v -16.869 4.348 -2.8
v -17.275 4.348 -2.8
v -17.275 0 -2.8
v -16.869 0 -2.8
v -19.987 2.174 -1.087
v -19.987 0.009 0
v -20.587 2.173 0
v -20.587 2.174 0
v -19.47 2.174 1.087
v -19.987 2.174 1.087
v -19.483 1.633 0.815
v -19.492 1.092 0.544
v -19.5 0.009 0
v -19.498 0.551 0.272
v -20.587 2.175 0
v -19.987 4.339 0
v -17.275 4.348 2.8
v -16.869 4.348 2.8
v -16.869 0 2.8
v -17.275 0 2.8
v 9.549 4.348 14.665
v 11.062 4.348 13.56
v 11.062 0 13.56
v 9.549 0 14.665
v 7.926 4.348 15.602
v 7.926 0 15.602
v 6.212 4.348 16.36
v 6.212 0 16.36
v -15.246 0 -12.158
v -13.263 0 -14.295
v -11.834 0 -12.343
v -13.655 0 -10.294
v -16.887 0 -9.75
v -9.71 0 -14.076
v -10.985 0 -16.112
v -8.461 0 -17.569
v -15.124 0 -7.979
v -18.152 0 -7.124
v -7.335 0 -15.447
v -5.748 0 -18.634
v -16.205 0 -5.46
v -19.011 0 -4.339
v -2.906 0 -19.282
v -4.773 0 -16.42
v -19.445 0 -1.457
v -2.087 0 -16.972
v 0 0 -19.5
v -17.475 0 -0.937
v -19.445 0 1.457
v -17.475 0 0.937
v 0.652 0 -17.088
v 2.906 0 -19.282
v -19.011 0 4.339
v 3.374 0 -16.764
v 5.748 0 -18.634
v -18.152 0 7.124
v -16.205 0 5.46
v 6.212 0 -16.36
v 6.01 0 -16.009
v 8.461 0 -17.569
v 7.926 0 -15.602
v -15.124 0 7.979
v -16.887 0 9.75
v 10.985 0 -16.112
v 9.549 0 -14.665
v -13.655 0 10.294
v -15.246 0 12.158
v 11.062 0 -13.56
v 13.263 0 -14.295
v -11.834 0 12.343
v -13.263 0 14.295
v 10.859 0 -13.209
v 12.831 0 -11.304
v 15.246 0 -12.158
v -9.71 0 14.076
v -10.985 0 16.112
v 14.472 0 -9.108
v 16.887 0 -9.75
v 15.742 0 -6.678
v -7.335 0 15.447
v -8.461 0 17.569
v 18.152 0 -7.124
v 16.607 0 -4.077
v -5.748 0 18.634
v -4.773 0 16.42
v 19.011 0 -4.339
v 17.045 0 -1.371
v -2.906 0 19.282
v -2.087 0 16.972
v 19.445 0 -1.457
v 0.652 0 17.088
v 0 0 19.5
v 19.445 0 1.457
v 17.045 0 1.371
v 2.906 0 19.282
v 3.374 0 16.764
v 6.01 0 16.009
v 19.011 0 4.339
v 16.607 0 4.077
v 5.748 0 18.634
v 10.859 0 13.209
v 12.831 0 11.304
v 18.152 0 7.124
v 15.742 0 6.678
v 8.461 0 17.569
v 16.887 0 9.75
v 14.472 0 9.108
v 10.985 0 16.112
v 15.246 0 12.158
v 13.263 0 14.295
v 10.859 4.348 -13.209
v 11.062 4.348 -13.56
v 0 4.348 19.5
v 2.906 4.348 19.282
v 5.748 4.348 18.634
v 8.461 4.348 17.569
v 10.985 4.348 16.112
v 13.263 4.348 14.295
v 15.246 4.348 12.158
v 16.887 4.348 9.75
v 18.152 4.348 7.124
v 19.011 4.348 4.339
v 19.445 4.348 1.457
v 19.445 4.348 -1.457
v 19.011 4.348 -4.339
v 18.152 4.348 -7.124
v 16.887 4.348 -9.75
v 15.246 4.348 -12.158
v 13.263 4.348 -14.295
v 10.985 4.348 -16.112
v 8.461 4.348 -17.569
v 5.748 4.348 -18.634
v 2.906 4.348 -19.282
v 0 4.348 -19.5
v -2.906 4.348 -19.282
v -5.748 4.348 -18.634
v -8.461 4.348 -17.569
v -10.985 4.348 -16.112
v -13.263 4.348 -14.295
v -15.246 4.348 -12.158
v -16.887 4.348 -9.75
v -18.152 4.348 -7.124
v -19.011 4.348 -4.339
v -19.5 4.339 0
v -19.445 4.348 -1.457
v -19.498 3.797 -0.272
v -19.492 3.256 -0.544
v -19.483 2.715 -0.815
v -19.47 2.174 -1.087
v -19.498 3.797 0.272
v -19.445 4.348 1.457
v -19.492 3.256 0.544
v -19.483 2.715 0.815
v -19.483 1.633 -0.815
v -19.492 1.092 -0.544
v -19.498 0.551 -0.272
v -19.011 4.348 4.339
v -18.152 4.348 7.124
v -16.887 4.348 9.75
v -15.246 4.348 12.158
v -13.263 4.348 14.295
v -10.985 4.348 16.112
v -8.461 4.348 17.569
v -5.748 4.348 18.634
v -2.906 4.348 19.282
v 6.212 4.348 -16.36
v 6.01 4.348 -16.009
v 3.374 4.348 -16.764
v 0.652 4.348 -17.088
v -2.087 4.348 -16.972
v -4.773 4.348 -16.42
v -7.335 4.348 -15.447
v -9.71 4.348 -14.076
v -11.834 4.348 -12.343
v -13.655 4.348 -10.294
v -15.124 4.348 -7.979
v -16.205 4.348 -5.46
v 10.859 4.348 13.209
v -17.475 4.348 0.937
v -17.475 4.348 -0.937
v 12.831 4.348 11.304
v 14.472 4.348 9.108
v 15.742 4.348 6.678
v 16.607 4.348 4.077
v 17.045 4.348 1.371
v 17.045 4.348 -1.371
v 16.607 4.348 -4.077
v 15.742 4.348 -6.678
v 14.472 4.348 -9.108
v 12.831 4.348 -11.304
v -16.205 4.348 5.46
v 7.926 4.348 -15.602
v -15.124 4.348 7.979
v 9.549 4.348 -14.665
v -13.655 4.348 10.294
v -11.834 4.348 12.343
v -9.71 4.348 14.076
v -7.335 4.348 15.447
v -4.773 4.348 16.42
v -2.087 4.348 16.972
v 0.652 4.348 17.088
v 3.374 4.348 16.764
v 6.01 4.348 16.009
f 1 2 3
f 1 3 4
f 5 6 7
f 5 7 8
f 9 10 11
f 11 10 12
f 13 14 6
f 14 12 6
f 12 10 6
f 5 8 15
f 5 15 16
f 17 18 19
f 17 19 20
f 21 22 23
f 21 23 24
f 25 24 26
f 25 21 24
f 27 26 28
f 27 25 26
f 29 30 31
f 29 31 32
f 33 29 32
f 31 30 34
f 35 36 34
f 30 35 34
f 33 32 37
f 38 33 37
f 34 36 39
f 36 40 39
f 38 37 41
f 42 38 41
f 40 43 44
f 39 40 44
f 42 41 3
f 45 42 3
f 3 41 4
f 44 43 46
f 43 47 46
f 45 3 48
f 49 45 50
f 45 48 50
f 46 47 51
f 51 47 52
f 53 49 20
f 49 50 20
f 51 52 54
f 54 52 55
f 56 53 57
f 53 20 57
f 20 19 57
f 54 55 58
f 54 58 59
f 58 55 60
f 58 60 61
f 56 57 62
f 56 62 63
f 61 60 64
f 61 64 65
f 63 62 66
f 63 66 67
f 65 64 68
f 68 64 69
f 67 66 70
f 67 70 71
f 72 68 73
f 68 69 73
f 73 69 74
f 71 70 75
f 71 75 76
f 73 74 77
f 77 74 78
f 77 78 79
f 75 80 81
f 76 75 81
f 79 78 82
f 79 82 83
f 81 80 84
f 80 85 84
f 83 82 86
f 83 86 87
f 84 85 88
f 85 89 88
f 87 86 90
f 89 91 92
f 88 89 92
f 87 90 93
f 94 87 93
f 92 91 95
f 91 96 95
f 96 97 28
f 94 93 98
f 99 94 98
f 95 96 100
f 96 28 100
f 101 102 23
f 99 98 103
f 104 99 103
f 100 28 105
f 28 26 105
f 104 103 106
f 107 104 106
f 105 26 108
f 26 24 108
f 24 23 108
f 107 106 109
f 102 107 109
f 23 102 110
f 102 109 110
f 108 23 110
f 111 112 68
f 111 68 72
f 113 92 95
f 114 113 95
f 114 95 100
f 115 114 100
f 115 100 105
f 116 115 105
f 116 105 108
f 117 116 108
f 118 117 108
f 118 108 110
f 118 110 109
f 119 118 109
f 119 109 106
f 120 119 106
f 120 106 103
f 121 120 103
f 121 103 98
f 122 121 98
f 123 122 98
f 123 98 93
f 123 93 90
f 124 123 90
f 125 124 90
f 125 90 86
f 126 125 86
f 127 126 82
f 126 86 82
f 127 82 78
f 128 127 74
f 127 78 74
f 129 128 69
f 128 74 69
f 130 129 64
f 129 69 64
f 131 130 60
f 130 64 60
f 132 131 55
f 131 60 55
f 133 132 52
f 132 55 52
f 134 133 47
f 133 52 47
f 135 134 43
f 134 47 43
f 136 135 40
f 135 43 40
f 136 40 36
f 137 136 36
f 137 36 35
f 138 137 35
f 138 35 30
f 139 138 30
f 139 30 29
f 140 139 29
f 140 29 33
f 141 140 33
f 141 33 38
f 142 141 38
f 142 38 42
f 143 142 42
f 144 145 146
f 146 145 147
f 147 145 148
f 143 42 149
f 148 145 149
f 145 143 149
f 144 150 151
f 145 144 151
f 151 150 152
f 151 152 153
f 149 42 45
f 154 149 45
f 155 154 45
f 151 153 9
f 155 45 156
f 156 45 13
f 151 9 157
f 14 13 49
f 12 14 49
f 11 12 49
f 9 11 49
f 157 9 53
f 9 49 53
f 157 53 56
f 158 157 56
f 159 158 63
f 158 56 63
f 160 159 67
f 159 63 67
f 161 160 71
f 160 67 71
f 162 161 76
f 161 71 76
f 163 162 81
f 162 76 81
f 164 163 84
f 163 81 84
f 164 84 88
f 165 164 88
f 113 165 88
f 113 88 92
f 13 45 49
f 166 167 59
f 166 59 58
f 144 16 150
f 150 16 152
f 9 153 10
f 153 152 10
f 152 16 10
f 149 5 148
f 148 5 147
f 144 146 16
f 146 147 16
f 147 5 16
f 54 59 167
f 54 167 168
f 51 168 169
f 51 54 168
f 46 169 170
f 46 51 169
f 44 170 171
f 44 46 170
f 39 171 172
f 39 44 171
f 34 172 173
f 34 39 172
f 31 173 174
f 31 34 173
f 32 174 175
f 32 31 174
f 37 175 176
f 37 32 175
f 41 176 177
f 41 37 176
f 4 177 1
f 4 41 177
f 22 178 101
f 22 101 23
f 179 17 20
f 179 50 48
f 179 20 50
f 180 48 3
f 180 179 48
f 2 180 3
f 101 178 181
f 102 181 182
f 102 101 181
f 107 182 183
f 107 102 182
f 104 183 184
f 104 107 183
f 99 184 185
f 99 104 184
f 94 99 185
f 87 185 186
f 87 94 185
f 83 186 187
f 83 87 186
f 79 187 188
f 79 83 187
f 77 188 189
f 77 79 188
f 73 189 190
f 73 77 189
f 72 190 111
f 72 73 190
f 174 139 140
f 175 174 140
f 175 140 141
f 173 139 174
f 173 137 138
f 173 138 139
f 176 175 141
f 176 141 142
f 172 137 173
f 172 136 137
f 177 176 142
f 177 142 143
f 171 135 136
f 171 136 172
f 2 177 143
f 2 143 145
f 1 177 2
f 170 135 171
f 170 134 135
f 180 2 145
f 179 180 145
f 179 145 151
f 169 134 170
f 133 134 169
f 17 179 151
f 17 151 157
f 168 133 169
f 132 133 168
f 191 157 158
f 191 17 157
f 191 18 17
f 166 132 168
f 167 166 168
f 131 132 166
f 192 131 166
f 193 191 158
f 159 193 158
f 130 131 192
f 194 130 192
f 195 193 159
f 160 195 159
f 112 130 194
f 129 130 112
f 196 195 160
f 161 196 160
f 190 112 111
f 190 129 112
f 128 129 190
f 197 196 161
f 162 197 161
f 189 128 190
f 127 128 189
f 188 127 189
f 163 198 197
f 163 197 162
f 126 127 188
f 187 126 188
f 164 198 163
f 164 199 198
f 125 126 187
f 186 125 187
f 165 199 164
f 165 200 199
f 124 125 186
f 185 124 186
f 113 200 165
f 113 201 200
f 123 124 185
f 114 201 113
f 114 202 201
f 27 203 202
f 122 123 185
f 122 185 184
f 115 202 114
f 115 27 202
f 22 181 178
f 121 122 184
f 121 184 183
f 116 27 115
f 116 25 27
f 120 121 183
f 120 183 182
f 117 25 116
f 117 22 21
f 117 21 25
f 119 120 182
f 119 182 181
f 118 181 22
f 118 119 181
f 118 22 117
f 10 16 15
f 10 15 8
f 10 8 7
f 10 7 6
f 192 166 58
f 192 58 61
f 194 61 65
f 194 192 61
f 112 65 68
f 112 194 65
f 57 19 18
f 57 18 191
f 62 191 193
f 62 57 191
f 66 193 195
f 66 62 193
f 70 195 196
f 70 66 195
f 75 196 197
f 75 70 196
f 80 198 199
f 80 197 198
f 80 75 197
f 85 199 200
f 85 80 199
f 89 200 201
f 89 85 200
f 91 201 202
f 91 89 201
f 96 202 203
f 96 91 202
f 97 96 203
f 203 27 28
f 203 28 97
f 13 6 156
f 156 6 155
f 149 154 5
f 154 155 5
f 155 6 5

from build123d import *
from OCP.BRepFilletAPI import BRepFilletAPI_MakeChamfer

# Parameters (mm, degrees)
SKETCH1_R           = 19.5
SKETCH1_R_2         = 17.1
BOSS_EXTRUDE1_DEPTH = 4.347826087
BOSS_EXTRUDE2_DEPTH = 1.08695652
CHAMFER1_SIZE       = 0.6
CHAMFER1_SIZE2      = 0.971
CUT_EXTRUDE1_DEPTH  = 29.687564735


with BuildPart() as part:
    # Sketch1 → Boss-Extrude1 (new body)
    with BuildSketch(Plane(origin=(0, 0, 0), x_dir=(1, 0, 0), z_dir=(0, 1, 0))):
        with Locations(Location((0, 0, 0), (0, 0, 270))):
            Circle(SKETCH1_R)
        with Locations(Location((0, 0, 0), (0, 0, 270))):
            Circle(SKETCH1_R_2, mode=Mode.SUBTRACT)
    extrude(amount=BOSS_EXTRUDE1_DEPTH)

    # Sketch2 → Boss-Extrude2 (add, symmetric)
    with BuildSketch(Plane.ZY.offset(19.5)):
        Polygon((0, 0.00928426), (-1.086956522, 2.173913043), (0, 4.338541827), (1.086956522, 2.173913043), align=None)
    extrude(amount=BOSS_EXTRUDE2_DEPTH, both=True)

    # Chamfer1: one chamfer whose edges measure the first distance from different faces: ONE call of the kernel's chamfer builder (chamfer() names one face for all edges)
    chamfer1_edges_1 = [part.edges().sort_by_distance(p)[0] for p in [
        (-20.58695652, 3.256227435, -0.543478261),
    ]]
    chamfer1_side_1 = [part.faces().sort_by_distance(p)[0] for p in [
        (-20.038389639, 3.251243161, -0.545981087),
    ]]
    chamfer1_edges_2 = [part.edges().sort_by_distance(p)[0] for p in [
        (-20.58695652, 1.091598652, -0.543478261),
    ]]
    chamfer1_side_2 = [part.faces().sort_by_distance(p)[0] for p in [
        (-20.038389639, 1.096582926, -0.545981087),
    ]]
    chamfer1_edges_3 = [part.edges().sort_by_distance(p)[0] for p in [
        (-20.58695652, 1.091598652, 0.543478261),
    ]]
    chamfer1_side_3 = [part.faces().sort_by_distance(p)[0] for p in [
        (-20.038389639, 1.096582926, 0.545981087),
    ]]
    chamfer1_edges_4 = [part.edges().sort_by_distance(p)[0] for p in [
        (-20.58695652, 3.256227435, 0.543478261),
    ]]
    chamfer1_side_4 = [part.faces().sort_by_distance(p)[0] for p in [
        (-20.038389639, 3.251243161, 0.545981087),
    ]]
    chamfer1 = BRepFilletAPI_MakeChamfer(part.part.solid().wrapped)
    for e in chamfer1_edges_1:
        chamfer1.Add(CHAMFER1_SIZE, CHAMFER1_SIZE2, e.wrapped, chamfer1_side_1[0].wrapped)  # the first distance lies on this face
    for e in chamfer1_edges_2:
        chamfer1.Add(CHAMFER1_SIZE, CHAMFER1_SIZE2, e.wrapped, chamfer1_side_2[0].wrapped)  # the first distance lies on this face
    for e in chamfer1_edges_3:
        chamfer1.Add(CHAMFER1_SIZE, CHAMFER1_SIZE2, e.wrapped, chamfer1_side_3[0].wrapped)  # the first distance lies on this face
    for e in chamfer1_edges_4:
        chamfer1.Add(CHAMFER1_SIZE, CHAMFER1_SIZE2, e.wrapped, chamfer1_side_4[0].wrapped)  # the first distance lies on this face
    add(Compound.cast(chamfer1.Shape()), mode=Mode.REPLACE)

    # Sketch3 → Cut-Extrude1 (cut, through all)
    with BuildSketch(Plane(origin=(0, 4.347826087, 0), x_dir=(1, 0, 0), z_dir=(0, 1, 0))):
        with BuildLine():
            Line((-17.274547751, 2.8), (-15.753094934, 2.8))
            ThreePointArc((-15.753094934, 2.8), (-16, 0), (-15.753094934, -2.8))
            Line((-15.753094934, -2.8), (-17.274547751, -2.8))
            ThreePointArc((-17.274547751, -2.8), (-17.5, 0), (-17.274547751, 2.8))
        make_face()
        with BuildLine():
            Line((11.062145006, 13.560197191), (10.301418598, 12.242580401))
            ThreePointArc((10.301418598, 12.242580401), (8, 13.856406461), (5.451676336, 15.042580401))
            Line((5.451676336, 15.042580401), (6.212402745, 16.360197191))
            ThreePointArc((6.212402745, 16.360197191), (8.75, 15.155444566), (11.062145006, 13.560197191))
        make_face()
        with BuildLine():
            Line((6.212402745, -16.360197191), (5.451676336, -15.042580401))
            ThreePointArc((5.451676336, -15.042580401), (8, -13.856406461), (10.301418598, -12.242580401))
            Line((10.301418598, -12.242580401), (11.062145006, -13.560197191))
            ThreePointArc((11.062145006, -13.560197191), (8.75, -15.155444566), (6.212402745, -16.360197191))
        make_face()
    extrude(amount=-CUT_EXTRUDE1_DEPTH, mode=Mode.SUBTRACT)


solid = part.part
